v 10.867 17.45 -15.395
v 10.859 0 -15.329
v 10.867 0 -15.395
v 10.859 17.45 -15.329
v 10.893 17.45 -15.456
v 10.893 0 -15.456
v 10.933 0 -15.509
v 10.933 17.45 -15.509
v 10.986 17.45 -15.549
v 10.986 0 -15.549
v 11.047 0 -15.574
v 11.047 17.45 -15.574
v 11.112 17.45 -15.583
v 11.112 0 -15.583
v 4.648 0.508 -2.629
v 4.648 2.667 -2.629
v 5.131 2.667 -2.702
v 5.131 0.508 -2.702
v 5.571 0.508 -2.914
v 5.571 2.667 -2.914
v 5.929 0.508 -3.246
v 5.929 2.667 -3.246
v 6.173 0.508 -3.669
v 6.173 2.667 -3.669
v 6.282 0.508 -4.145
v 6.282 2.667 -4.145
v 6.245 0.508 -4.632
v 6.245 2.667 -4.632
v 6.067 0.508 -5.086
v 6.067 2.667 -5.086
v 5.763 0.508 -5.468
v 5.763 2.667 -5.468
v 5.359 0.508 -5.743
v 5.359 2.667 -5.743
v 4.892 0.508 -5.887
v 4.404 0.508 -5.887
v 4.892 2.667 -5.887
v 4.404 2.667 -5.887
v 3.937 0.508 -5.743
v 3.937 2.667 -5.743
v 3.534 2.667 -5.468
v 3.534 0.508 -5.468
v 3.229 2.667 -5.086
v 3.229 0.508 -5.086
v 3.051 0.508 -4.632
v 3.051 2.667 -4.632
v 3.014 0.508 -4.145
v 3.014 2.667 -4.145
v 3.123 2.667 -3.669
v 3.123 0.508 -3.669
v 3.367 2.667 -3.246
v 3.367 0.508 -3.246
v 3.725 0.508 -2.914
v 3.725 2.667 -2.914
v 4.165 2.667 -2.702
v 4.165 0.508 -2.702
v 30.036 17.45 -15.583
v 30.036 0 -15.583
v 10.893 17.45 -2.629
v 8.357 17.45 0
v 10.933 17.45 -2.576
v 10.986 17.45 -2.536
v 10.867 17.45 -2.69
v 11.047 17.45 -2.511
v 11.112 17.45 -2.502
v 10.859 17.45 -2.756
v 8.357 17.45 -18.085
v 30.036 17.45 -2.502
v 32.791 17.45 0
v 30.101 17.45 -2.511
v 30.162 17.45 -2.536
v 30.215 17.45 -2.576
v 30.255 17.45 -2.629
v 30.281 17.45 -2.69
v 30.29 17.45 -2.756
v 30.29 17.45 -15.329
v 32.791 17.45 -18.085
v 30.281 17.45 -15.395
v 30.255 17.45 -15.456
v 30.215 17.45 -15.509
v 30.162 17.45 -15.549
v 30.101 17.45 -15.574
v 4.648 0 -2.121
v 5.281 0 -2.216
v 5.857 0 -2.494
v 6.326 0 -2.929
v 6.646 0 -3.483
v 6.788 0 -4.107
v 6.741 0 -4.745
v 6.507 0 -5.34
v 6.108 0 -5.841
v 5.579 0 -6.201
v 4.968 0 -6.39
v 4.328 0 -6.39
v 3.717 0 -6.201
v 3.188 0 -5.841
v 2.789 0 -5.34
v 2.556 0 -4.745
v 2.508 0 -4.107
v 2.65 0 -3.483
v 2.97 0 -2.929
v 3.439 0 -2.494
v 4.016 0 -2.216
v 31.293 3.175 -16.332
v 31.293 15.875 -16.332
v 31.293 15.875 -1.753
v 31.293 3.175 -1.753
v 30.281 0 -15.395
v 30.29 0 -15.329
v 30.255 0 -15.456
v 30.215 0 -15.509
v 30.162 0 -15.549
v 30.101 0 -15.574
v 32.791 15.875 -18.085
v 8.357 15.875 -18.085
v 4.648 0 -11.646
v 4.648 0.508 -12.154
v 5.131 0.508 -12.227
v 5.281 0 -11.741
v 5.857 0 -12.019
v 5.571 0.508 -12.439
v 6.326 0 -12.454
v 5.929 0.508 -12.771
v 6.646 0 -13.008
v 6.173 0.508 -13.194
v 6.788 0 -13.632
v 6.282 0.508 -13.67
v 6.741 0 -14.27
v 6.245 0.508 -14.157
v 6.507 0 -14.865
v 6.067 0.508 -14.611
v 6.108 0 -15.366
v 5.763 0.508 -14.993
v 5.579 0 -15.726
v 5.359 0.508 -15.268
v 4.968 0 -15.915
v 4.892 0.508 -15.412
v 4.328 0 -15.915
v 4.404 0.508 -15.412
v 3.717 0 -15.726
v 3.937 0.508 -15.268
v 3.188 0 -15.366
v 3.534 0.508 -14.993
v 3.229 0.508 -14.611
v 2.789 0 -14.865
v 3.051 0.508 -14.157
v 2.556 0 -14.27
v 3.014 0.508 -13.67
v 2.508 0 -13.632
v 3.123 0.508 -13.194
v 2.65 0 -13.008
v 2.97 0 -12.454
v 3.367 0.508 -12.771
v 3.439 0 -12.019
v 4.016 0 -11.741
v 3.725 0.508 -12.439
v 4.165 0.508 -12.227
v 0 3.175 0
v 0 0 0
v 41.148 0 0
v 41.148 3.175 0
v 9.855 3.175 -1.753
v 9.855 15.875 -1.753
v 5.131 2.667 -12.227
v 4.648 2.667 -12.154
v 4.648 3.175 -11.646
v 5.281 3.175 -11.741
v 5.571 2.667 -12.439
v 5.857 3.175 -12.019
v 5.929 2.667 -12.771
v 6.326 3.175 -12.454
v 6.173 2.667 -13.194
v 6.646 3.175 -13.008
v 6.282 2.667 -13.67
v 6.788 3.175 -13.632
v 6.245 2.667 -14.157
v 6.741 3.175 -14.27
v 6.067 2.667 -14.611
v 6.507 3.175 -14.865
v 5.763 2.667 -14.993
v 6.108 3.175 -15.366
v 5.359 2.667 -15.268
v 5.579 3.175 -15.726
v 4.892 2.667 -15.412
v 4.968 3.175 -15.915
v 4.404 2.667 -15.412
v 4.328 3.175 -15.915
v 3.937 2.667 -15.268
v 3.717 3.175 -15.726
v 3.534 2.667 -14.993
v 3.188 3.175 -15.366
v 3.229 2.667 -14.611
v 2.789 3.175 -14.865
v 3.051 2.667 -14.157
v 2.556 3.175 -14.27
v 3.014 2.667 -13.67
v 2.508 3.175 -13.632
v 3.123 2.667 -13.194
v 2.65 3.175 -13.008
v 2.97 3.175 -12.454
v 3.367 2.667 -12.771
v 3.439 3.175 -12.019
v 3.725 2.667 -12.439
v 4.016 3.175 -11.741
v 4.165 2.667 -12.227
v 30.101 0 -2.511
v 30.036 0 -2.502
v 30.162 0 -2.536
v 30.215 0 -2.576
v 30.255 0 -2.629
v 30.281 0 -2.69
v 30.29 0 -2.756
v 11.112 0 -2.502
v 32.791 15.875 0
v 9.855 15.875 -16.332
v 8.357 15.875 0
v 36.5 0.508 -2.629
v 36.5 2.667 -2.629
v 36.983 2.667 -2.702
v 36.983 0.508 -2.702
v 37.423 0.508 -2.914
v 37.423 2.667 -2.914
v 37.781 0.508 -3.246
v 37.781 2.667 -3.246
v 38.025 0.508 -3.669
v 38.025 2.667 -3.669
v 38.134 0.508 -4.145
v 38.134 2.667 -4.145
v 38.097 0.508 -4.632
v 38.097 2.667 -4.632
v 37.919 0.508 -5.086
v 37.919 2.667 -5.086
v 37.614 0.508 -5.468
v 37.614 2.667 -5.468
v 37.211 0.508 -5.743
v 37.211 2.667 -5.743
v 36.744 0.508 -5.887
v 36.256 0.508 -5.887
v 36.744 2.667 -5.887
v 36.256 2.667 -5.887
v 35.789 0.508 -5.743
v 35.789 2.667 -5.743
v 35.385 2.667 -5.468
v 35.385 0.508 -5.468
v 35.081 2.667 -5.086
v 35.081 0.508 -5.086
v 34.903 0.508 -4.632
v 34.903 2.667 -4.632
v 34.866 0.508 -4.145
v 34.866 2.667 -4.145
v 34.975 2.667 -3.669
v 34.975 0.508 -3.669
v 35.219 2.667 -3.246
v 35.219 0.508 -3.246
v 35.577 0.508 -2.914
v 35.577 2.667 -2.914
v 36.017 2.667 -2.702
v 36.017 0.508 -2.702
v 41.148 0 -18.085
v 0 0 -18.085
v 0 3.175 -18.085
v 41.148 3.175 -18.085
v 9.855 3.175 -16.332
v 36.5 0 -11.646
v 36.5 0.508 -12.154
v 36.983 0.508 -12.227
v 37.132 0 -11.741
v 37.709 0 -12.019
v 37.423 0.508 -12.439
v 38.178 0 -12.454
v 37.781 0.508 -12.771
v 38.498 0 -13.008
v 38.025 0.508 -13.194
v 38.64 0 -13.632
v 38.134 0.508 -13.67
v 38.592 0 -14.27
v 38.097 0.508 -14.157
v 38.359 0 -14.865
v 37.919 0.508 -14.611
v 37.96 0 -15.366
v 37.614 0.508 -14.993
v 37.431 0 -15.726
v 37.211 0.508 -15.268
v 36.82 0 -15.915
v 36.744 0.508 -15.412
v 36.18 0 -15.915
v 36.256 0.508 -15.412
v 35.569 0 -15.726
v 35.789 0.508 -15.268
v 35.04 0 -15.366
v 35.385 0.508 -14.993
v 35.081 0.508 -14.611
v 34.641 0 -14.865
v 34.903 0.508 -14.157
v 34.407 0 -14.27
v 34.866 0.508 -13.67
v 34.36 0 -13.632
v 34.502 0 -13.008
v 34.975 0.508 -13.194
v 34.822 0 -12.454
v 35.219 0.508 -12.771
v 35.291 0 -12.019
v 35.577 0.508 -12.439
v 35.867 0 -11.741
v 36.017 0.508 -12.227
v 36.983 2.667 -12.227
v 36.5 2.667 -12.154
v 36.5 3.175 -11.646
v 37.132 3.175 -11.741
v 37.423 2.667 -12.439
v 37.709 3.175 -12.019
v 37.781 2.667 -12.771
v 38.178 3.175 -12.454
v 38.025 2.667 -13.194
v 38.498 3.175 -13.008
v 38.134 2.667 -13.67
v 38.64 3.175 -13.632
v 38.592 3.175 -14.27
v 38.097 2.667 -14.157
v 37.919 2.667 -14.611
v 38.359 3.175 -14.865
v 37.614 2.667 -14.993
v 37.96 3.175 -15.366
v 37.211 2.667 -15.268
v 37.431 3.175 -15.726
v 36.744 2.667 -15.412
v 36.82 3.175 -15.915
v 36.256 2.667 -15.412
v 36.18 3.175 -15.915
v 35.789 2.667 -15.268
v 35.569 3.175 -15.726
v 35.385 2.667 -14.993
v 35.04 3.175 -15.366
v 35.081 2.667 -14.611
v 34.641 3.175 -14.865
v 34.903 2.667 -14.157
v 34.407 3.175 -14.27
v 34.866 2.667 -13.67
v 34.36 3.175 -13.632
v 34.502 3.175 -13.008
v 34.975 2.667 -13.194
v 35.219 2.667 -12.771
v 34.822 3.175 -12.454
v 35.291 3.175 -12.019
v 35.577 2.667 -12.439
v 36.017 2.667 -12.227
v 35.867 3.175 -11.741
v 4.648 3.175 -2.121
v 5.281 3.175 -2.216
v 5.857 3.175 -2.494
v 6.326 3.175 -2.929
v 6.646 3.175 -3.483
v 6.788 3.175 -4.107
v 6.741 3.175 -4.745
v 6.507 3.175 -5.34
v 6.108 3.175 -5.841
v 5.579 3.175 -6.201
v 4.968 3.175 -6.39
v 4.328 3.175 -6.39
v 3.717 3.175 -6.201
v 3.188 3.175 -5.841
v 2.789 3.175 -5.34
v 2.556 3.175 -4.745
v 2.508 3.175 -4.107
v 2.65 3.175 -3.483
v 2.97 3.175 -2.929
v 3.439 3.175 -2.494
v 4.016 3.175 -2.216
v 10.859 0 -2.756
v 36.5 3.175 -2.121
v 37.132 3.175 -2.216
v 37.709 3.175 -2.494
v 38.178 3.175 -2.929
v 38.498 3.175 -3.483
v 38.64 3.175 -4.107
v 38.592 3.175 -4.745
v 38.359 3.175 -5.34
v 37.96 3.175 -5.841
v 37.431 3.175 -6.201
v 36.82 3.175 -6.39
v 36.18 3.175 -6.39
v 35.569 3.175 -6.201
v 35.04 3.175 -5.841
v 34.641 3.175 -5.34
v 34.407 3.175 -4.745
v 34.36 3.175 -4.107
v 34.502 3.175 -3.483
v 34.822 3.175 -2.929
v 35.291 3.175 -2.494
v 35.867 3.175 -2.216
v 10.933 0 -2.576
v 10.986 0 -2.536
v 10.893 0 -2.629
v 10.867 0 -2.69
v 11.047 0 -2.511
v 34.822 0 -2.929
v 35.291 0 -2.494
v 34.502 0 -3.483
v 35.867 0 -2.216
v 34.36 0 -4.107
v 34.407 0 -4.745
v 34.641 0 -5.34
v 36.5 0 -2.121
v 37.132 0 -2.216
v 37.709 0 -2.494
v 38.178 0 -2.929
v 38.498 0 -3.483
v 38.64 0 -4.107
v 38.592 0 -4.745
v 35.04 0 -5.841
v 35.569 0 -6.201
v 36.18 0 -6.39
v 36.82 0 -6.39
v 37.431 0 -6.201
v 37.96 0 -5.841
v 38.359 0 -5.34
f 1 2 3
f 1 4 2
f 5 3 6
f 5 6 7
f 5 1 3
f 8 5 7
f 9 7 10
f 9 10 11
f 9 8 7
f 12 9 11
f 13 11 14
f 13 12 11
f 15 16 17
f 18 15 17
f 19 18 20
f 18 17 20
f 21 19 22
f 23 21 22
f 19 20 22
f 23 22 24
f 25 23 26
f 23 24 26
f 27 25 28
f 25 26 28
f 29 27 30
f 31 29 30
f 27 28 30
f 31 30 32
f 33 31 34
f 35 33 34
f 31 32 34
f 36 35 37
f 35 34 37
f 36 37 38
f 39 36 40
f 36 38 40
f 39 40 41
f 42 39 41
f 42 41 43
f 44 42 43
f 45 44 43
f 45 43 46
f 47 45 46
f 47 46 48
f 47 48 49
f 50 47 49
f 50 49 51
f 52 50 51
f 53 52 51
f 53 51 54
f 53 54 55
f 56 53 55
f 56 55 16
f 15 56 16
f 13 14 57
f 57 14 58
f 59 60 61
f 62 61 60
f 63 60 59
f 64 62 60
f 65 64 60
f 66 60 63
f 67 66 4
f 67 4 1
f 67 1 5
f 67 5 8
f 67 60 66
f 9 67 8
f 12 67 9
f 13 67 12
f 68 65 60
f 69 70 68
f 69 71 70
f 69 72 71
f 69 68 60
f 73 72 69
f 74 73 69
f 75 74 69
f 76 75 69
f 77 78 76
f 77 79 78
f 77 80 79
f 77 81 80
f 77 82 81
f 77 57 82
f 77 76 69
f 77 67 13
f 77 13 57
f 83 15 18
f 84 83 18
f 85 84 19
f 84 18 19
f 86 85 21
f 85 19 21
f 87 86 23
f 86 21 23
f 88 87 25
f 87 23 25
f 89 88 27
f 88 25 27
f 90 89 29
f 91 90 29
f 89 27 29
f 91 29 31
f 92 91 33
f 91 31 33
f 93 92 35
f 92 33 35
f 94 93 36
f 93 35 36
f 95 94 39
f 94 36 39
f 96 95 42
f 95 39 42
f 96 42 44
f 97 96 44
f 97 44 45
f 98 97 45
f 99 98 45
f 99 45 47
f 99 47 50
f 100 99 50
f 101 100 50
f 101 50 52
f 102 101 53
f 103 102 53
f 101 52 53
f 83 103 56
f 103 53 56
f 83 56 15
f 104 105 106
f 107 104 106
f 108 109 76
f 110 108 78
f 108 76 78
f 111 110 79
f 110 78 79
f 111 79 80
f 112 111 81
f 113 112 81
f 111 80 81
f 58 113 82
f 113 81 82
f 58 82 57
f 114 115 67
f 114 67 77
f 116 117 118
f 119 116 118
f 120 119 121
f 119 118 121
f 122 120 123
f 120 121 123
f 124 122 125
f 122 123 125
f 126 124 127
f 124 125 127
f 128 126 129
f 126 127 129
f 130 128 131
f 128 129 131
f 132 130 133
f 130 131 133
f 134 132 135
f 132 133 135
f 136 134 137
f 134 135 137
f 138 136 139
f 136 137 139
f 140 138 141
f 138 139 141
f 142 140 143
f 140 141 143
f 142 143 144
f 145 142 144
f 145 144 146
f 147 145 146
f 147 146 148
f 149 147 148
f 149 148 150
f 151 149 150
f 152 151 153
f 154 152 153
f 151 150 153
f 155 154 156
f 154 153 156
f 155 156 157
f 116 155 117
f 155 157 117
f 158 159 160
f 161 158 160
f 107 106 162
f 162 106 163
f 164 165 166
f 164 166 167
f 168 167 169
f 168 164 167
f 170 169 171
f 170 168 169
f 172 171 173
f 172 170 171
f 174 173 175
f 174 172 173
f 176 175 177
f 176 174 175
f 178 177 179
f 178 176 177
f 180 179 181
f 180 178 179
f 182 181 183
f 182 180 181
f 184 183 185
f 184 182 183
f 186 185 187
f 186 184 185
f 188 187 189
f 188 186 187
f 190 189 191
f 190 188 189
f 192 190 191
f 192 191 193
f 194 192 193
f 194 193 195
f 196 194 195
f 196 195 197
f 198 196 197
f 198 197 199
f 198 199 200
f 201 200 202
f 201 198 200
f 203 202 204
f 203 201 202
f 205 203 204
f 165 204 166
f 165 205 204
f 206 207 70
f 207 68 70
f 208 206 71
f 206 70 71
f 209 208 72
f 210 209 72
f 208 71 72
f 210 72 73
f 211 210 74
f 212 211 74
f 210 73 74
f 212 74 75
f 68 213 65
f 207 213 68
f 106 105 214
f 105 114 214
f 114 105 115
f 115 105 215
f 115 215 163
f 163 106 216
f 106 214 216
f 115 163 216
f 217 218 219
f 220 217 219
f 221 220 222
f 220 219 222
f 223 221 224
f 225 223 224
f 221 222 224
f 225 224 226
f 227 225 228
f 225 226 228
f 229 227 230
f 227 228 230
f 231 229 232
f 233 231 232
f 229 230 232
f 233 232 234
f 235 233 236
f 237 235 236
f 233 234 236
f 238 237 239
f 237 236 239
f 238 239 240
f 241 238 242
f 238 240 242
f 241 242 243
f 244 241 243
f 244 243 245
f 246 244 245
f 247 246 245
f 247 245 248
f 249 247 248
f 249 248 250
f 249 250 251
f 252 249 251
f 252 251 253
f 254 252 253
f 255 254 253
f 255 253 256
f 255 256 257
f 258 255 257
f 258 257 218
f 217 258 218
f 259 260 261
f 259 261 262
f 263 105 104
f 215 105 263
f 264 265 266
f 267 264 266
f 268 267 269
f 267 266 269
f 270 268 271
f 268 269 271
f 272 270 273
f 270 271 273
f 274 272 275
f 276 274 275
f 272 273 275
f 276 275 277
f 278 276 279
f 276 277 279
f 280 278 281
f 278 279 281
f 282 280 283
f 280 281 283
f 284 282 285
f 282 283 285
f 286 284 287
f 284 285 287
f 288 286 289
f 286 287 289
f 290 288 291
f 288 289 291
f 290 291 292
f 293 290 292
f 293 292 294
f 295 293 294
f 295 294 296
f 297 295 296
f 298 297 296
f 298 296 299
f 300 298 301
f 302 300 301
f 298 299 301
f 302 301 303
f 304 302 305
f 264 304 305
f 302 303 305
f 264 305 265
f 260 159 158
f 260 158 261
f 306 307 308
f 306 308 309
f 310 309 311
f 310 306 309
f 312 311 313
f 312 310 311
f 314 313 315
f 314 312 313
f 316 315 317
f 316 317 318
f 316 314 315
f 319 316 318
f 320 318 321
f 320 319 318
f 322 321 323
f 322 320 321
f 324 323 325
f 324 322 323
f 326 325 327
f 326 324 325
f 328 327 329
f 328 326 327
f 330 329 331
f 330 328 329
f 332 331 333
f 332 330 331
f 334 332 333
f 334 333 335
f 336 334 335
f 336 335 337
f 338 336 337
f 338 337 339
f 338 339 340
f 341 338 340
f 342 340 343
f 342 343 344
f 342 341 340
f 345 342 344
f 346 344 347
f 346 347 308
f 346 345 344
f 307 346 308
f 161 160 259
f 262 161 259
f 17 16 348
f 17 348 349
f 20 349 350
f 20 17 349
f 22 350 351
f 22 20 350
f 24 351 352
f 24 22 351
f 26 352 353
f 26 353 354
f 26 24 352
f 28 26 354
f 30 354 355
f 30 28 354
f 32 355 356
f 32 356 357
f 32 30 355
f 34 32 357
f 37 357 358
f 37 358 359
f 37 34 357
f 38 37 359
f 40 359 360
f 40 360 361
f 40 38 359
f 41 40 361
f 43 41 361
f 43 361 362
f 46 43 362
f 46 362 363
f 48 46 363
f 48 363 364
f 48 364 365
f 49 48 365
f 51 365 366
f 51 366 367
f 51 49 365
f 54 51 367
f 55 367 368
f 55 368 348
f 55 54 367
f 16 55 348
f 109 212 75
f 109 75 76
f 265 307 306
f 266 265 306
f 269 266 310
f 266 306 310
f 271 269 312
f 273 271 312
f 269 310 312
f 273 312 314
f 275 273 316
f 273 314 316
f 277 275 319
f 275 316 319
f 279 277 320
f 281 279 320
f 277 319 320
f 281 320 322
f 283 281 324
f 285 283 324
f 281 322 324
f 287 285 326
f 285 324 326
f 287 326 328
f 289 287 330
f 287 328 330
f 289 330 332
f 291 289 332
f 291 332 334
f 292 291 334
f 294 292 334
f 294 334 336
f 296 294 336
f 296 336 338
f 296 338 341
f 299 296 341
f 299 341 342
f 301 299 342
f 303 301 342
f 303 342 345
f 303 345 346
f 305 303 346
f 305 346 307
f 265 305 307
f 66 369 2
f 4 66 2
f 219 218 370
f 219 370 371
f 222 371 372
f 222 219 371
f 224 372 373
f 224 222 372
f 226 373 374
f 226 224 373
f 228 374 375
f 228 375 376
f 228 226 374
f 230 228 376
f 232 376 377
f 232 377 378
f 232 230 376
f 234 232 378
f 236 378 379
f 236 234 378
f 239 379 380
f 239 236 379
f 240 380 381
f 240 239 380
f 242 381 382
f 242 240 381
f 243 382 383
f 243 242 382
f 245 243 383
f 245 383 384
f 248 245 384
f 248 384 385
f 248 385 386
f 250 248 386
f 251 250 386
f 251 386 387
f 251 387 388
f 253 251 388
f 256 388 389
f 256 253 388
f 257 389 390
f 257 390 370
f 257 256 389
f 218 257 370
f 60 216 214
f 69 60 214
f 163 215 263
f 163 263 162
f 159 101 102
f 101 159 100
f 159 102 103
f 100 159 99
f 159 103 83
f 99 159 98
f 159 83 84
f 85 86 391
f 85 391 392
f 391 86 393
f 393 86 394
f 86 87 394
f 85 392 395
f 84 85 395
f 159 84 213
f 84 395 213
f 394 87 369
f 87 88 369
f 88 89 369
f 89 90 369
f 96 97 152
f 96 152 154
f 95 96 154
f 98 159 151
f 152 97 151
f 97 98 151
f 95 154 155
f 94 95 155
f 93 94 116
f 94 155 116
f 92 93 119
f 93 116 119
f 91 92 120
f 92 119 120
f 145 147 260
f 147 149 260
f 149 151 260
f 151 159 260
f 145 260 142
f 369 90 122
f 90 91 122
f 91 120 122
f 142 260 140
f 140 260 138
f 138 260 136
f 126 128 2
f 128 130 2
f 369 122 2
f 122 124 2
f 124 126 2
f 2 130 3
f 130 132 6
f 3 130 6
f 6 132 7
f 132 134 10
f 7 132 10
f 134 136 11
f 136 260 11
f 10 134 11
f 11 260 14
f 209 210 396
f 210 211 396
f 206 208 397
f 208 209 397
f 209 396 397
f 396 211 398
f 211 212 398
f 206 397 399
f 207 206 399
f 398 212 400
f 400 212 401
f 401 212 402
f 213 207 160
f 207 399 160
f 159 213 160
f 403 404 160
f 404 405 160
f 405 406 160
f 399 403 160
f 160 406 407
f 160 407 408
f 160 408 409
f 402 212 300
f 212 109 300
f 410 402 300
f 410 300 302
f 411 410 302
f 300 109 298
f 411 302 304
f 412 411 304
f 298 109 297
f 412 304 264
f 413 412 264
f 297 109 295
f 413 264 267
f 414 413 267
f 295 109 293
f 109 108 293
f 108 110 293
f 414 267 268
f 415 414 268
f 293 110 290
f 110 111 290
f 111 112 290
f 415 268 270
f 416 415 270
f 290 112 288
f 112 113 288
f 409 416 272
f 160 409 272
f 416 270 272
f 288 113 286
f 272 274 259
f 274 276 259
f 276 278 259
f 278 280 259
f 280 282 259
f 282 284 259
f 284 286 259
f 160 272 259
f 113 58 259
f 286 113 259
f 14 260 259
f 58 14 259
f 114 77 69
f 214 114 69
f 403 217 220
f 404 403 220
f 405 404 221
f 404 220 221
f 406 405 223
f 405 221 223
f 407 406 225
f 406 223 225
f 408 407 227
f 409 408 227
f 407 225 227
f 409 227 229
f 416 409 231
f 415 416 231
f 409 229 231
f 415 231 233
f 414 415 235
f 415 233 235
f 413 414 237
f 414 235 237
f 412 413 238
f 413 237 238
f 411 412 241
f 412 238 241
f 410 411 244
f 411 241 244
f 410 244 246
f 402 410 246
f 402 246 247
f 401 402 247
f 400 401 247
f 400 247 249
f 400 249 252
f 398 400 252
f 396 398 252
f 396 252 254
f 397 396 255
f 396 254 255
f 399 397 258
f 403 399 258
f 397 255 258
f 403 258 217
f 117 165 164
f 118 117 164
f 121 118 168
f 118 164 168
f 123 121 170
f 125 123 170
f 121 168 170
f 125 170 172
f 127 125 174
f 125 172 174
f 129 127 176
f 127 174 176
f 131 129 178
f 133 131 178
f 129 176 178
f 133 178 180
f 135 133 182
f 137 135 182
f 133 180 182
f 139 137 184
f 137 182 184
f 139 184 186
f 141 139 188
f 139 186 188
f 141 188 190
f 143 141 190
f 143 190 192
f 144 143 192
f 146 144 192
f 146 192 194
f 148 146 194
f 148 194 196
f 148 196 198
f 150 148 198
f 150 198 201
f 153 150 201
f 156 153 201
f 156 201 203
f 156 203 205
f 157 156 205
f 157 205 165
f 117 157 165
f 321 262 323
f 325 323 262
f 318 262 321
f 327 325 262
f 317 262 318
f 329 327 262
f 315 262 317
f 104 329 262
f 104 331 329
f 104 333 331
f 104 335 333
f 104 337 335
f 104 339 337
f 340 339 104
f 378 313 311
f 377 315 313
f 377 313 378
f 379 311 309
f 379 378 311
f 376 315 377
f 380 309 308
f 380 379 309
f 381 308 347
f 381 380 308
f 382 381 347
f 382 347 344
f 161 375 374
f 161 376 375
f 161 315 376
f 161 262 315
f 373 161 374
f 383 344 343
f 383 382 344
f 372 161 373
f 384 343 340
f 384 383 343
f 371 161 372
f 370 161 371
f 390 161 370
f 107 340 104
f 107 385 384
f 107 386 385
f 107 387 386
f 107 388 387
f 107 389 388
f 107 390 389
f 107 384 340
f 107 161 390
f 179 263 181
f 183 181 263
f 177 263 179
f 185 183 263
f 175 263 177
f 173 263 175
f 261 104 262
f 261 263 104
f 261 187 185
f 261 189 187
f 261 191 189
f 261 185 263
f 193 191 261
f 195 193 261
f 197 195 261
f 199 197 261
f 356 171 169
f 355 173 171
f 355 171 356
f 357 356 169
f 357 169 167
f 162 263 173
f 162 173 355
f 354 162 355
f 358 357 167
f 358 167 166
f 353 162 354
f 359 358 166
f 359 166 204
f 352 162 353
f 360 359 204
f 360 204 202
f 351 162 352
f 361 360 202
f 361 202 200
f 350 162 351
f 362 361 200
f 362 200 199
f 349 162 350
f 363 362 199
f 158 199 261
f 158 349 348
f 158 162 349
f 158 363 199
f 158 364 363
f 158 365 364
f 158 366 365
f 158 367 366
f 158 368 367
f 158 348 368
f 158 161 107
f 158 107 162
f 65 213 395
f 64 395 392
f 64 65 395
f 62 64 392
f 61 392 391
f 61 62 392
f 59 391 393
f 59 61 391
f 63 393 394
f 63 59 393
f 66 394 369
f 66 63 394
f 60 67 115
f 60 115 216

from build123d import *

# Parameters (mm, degrees)
SKETCH1_W          = 41.148
SKETCH1_H          = 18.0848
SKETCH1_W_2        = 19.431
SKETCH1_H_2        = 13.081
EXTRUDE1_DEPTH     = 17.4498
SKETCH2_W          = 8.3566
SKETCH2_H          = 18.0848
CUT_EXTRUDE1_DEPTH = 14.2748
CUT_EXTRUDE2_START = -1.5748
SKETCH3_W          = 24.4348
SKETCH3_H          = 18.0848
SKETCH3_W_2        = 21.4376
SKETCH3_H_2        = 14.5796
CUT_EXTRUDE2_DEPTH = 12.7
SKETCH4_R          = 1.6383
CUT_EXTRUDE3_DEPTH = 4.175
CHAMFER1_SIZE      = 0.508
FILLET1_R          = 0.254
CHAMFER2_SIZE      = 0.508


with BuildPart() as part:
    # Sketch1 → Extrude1 (new body)
    with BuildSketch(Plane(origin=(0, 0, 0), x_dir=(1, 0, 0), z_dir=(0, 1, 0))):
        with Locations((20.574, 9.0424)):
            Rectangle(SKETCH1_W, SKETCH1_H)
        with Locations((20.574, 9.0424)):
            Rectangle(SKETCH1_W_2, SKETCH1_H_2, mode=Mode.SUBTRACT)
    extrude(amount=EXTRUDE1_DEPTH)

    # Sketch2 → Cut-Extrude1 (cut)
    with BuildSketch(Plane(origin=(0, 17.4498, 0), x_dir=(-1, 0, 0), z_dir=(0, 1, 0))):
        with Locations((-4.1783, -9.0424)):
            Rectangle(SKETCH2_W, SKETCH2_H)
        with Locations((-36.9697, -9.0424)):
            Rectangle(SKETCH2_W, SKETCH2_H)
    extrude(amount=-CUT_EXTRUDE1_DEPTH, mode=Mode.SUBTRACT)

    # Sketch3 → Cut-Extrude2 (cut)
    with BuildSketch(Plane(origin=(0, 17.4498, 0), x_dir=(-1, 0, 0), z_dir=(0, 1, 0)).offset(CUT_EXTRUDE2_START)):
        with Locations((-20.574, -9.0424)):
            Rectangle(SKETCH3_W, SKETCH3_H)
        with Locations((-20.574, -9.0424)):
            Rectangle(SKETCH3_W_2, SKETCH3_H_2, mode=Mode.SUBTRACT)
    extrude(amount=-CUT_EXTRUDE2_DEPTH, mode=Mode.SUBTRACT)

    # Sketch4 → Cut-Extrude3 (cut, through all)
    with BuildSketch(Plane(origin=(0, 3.175, 0), x_dir=(-1, 0, 0), z_dir=(0, 1, 0))):
        with Locations(Location((-36.4998, -13.7922, 0), (0, 0, 90))):  # turned: the seam where the file's is
            Circle(SKETCH4_R)
        with Locations(Location((-36.4998, -4.2672, 0), (0, 0, 90))):  # turned: the seam where the file's is
            Circle(SKETCH4_R)
        with Locations(Location((-4.6482, -4.2672, 0), (0, 0, 90))):  # turned: the seam where the file's is
            Circle(SKETCH4_R)
        with Locations(Location((-4.6482, -13.7922, 0), (0, 0, 90))):  # turned: the seam where the file's is
            Circle(SKETCH4_R)
    extrude(amount=-CUT_EXTRUDE3_DEPTH, mode=Mode.SUBTRACT)

    # Chamfer1
    chamfer1_edges = [part.edges().sort_by_distance(p)[0] for p in [
        (36.4998, 3.175, -15.4305),
        (36.4998, 3.175, -5.9055),
        (4.6482, 3.175, -5.9055),
        (4.6482, 3.175, -15.4305),
    ]]
    chamfer(chamfer1_edges, length=CHAMFER1_SIZE)

    # Fillet1
    fillet1_edges = [part.edges().sort_by_distance(p)[0] for p in [
        (10.8585, 8.7249, -15.5829),
        (10.8585, 8.7249, -2.5019),
        (30.2895, 8.7249, -2.5019),
        (30.2895, 8.7249, -15.5829),
    ]]
    fillet(fillet1_edges, radius=FILLET1_R)

    # Chamfer2
    chamfer2_edges = [part.edges().sort_by_distance(p)[0] for p in [
        (36.4998, 0, -15.4305),
        (36.4998, 0, -5.9055),
        (4.6482, 0, -5.9055),
        (4.6482, 0, -15.4305),
    ]]
    chamfer(chamfer2_edges, length=CHAMFER2_SIZE)


solid = part.part
